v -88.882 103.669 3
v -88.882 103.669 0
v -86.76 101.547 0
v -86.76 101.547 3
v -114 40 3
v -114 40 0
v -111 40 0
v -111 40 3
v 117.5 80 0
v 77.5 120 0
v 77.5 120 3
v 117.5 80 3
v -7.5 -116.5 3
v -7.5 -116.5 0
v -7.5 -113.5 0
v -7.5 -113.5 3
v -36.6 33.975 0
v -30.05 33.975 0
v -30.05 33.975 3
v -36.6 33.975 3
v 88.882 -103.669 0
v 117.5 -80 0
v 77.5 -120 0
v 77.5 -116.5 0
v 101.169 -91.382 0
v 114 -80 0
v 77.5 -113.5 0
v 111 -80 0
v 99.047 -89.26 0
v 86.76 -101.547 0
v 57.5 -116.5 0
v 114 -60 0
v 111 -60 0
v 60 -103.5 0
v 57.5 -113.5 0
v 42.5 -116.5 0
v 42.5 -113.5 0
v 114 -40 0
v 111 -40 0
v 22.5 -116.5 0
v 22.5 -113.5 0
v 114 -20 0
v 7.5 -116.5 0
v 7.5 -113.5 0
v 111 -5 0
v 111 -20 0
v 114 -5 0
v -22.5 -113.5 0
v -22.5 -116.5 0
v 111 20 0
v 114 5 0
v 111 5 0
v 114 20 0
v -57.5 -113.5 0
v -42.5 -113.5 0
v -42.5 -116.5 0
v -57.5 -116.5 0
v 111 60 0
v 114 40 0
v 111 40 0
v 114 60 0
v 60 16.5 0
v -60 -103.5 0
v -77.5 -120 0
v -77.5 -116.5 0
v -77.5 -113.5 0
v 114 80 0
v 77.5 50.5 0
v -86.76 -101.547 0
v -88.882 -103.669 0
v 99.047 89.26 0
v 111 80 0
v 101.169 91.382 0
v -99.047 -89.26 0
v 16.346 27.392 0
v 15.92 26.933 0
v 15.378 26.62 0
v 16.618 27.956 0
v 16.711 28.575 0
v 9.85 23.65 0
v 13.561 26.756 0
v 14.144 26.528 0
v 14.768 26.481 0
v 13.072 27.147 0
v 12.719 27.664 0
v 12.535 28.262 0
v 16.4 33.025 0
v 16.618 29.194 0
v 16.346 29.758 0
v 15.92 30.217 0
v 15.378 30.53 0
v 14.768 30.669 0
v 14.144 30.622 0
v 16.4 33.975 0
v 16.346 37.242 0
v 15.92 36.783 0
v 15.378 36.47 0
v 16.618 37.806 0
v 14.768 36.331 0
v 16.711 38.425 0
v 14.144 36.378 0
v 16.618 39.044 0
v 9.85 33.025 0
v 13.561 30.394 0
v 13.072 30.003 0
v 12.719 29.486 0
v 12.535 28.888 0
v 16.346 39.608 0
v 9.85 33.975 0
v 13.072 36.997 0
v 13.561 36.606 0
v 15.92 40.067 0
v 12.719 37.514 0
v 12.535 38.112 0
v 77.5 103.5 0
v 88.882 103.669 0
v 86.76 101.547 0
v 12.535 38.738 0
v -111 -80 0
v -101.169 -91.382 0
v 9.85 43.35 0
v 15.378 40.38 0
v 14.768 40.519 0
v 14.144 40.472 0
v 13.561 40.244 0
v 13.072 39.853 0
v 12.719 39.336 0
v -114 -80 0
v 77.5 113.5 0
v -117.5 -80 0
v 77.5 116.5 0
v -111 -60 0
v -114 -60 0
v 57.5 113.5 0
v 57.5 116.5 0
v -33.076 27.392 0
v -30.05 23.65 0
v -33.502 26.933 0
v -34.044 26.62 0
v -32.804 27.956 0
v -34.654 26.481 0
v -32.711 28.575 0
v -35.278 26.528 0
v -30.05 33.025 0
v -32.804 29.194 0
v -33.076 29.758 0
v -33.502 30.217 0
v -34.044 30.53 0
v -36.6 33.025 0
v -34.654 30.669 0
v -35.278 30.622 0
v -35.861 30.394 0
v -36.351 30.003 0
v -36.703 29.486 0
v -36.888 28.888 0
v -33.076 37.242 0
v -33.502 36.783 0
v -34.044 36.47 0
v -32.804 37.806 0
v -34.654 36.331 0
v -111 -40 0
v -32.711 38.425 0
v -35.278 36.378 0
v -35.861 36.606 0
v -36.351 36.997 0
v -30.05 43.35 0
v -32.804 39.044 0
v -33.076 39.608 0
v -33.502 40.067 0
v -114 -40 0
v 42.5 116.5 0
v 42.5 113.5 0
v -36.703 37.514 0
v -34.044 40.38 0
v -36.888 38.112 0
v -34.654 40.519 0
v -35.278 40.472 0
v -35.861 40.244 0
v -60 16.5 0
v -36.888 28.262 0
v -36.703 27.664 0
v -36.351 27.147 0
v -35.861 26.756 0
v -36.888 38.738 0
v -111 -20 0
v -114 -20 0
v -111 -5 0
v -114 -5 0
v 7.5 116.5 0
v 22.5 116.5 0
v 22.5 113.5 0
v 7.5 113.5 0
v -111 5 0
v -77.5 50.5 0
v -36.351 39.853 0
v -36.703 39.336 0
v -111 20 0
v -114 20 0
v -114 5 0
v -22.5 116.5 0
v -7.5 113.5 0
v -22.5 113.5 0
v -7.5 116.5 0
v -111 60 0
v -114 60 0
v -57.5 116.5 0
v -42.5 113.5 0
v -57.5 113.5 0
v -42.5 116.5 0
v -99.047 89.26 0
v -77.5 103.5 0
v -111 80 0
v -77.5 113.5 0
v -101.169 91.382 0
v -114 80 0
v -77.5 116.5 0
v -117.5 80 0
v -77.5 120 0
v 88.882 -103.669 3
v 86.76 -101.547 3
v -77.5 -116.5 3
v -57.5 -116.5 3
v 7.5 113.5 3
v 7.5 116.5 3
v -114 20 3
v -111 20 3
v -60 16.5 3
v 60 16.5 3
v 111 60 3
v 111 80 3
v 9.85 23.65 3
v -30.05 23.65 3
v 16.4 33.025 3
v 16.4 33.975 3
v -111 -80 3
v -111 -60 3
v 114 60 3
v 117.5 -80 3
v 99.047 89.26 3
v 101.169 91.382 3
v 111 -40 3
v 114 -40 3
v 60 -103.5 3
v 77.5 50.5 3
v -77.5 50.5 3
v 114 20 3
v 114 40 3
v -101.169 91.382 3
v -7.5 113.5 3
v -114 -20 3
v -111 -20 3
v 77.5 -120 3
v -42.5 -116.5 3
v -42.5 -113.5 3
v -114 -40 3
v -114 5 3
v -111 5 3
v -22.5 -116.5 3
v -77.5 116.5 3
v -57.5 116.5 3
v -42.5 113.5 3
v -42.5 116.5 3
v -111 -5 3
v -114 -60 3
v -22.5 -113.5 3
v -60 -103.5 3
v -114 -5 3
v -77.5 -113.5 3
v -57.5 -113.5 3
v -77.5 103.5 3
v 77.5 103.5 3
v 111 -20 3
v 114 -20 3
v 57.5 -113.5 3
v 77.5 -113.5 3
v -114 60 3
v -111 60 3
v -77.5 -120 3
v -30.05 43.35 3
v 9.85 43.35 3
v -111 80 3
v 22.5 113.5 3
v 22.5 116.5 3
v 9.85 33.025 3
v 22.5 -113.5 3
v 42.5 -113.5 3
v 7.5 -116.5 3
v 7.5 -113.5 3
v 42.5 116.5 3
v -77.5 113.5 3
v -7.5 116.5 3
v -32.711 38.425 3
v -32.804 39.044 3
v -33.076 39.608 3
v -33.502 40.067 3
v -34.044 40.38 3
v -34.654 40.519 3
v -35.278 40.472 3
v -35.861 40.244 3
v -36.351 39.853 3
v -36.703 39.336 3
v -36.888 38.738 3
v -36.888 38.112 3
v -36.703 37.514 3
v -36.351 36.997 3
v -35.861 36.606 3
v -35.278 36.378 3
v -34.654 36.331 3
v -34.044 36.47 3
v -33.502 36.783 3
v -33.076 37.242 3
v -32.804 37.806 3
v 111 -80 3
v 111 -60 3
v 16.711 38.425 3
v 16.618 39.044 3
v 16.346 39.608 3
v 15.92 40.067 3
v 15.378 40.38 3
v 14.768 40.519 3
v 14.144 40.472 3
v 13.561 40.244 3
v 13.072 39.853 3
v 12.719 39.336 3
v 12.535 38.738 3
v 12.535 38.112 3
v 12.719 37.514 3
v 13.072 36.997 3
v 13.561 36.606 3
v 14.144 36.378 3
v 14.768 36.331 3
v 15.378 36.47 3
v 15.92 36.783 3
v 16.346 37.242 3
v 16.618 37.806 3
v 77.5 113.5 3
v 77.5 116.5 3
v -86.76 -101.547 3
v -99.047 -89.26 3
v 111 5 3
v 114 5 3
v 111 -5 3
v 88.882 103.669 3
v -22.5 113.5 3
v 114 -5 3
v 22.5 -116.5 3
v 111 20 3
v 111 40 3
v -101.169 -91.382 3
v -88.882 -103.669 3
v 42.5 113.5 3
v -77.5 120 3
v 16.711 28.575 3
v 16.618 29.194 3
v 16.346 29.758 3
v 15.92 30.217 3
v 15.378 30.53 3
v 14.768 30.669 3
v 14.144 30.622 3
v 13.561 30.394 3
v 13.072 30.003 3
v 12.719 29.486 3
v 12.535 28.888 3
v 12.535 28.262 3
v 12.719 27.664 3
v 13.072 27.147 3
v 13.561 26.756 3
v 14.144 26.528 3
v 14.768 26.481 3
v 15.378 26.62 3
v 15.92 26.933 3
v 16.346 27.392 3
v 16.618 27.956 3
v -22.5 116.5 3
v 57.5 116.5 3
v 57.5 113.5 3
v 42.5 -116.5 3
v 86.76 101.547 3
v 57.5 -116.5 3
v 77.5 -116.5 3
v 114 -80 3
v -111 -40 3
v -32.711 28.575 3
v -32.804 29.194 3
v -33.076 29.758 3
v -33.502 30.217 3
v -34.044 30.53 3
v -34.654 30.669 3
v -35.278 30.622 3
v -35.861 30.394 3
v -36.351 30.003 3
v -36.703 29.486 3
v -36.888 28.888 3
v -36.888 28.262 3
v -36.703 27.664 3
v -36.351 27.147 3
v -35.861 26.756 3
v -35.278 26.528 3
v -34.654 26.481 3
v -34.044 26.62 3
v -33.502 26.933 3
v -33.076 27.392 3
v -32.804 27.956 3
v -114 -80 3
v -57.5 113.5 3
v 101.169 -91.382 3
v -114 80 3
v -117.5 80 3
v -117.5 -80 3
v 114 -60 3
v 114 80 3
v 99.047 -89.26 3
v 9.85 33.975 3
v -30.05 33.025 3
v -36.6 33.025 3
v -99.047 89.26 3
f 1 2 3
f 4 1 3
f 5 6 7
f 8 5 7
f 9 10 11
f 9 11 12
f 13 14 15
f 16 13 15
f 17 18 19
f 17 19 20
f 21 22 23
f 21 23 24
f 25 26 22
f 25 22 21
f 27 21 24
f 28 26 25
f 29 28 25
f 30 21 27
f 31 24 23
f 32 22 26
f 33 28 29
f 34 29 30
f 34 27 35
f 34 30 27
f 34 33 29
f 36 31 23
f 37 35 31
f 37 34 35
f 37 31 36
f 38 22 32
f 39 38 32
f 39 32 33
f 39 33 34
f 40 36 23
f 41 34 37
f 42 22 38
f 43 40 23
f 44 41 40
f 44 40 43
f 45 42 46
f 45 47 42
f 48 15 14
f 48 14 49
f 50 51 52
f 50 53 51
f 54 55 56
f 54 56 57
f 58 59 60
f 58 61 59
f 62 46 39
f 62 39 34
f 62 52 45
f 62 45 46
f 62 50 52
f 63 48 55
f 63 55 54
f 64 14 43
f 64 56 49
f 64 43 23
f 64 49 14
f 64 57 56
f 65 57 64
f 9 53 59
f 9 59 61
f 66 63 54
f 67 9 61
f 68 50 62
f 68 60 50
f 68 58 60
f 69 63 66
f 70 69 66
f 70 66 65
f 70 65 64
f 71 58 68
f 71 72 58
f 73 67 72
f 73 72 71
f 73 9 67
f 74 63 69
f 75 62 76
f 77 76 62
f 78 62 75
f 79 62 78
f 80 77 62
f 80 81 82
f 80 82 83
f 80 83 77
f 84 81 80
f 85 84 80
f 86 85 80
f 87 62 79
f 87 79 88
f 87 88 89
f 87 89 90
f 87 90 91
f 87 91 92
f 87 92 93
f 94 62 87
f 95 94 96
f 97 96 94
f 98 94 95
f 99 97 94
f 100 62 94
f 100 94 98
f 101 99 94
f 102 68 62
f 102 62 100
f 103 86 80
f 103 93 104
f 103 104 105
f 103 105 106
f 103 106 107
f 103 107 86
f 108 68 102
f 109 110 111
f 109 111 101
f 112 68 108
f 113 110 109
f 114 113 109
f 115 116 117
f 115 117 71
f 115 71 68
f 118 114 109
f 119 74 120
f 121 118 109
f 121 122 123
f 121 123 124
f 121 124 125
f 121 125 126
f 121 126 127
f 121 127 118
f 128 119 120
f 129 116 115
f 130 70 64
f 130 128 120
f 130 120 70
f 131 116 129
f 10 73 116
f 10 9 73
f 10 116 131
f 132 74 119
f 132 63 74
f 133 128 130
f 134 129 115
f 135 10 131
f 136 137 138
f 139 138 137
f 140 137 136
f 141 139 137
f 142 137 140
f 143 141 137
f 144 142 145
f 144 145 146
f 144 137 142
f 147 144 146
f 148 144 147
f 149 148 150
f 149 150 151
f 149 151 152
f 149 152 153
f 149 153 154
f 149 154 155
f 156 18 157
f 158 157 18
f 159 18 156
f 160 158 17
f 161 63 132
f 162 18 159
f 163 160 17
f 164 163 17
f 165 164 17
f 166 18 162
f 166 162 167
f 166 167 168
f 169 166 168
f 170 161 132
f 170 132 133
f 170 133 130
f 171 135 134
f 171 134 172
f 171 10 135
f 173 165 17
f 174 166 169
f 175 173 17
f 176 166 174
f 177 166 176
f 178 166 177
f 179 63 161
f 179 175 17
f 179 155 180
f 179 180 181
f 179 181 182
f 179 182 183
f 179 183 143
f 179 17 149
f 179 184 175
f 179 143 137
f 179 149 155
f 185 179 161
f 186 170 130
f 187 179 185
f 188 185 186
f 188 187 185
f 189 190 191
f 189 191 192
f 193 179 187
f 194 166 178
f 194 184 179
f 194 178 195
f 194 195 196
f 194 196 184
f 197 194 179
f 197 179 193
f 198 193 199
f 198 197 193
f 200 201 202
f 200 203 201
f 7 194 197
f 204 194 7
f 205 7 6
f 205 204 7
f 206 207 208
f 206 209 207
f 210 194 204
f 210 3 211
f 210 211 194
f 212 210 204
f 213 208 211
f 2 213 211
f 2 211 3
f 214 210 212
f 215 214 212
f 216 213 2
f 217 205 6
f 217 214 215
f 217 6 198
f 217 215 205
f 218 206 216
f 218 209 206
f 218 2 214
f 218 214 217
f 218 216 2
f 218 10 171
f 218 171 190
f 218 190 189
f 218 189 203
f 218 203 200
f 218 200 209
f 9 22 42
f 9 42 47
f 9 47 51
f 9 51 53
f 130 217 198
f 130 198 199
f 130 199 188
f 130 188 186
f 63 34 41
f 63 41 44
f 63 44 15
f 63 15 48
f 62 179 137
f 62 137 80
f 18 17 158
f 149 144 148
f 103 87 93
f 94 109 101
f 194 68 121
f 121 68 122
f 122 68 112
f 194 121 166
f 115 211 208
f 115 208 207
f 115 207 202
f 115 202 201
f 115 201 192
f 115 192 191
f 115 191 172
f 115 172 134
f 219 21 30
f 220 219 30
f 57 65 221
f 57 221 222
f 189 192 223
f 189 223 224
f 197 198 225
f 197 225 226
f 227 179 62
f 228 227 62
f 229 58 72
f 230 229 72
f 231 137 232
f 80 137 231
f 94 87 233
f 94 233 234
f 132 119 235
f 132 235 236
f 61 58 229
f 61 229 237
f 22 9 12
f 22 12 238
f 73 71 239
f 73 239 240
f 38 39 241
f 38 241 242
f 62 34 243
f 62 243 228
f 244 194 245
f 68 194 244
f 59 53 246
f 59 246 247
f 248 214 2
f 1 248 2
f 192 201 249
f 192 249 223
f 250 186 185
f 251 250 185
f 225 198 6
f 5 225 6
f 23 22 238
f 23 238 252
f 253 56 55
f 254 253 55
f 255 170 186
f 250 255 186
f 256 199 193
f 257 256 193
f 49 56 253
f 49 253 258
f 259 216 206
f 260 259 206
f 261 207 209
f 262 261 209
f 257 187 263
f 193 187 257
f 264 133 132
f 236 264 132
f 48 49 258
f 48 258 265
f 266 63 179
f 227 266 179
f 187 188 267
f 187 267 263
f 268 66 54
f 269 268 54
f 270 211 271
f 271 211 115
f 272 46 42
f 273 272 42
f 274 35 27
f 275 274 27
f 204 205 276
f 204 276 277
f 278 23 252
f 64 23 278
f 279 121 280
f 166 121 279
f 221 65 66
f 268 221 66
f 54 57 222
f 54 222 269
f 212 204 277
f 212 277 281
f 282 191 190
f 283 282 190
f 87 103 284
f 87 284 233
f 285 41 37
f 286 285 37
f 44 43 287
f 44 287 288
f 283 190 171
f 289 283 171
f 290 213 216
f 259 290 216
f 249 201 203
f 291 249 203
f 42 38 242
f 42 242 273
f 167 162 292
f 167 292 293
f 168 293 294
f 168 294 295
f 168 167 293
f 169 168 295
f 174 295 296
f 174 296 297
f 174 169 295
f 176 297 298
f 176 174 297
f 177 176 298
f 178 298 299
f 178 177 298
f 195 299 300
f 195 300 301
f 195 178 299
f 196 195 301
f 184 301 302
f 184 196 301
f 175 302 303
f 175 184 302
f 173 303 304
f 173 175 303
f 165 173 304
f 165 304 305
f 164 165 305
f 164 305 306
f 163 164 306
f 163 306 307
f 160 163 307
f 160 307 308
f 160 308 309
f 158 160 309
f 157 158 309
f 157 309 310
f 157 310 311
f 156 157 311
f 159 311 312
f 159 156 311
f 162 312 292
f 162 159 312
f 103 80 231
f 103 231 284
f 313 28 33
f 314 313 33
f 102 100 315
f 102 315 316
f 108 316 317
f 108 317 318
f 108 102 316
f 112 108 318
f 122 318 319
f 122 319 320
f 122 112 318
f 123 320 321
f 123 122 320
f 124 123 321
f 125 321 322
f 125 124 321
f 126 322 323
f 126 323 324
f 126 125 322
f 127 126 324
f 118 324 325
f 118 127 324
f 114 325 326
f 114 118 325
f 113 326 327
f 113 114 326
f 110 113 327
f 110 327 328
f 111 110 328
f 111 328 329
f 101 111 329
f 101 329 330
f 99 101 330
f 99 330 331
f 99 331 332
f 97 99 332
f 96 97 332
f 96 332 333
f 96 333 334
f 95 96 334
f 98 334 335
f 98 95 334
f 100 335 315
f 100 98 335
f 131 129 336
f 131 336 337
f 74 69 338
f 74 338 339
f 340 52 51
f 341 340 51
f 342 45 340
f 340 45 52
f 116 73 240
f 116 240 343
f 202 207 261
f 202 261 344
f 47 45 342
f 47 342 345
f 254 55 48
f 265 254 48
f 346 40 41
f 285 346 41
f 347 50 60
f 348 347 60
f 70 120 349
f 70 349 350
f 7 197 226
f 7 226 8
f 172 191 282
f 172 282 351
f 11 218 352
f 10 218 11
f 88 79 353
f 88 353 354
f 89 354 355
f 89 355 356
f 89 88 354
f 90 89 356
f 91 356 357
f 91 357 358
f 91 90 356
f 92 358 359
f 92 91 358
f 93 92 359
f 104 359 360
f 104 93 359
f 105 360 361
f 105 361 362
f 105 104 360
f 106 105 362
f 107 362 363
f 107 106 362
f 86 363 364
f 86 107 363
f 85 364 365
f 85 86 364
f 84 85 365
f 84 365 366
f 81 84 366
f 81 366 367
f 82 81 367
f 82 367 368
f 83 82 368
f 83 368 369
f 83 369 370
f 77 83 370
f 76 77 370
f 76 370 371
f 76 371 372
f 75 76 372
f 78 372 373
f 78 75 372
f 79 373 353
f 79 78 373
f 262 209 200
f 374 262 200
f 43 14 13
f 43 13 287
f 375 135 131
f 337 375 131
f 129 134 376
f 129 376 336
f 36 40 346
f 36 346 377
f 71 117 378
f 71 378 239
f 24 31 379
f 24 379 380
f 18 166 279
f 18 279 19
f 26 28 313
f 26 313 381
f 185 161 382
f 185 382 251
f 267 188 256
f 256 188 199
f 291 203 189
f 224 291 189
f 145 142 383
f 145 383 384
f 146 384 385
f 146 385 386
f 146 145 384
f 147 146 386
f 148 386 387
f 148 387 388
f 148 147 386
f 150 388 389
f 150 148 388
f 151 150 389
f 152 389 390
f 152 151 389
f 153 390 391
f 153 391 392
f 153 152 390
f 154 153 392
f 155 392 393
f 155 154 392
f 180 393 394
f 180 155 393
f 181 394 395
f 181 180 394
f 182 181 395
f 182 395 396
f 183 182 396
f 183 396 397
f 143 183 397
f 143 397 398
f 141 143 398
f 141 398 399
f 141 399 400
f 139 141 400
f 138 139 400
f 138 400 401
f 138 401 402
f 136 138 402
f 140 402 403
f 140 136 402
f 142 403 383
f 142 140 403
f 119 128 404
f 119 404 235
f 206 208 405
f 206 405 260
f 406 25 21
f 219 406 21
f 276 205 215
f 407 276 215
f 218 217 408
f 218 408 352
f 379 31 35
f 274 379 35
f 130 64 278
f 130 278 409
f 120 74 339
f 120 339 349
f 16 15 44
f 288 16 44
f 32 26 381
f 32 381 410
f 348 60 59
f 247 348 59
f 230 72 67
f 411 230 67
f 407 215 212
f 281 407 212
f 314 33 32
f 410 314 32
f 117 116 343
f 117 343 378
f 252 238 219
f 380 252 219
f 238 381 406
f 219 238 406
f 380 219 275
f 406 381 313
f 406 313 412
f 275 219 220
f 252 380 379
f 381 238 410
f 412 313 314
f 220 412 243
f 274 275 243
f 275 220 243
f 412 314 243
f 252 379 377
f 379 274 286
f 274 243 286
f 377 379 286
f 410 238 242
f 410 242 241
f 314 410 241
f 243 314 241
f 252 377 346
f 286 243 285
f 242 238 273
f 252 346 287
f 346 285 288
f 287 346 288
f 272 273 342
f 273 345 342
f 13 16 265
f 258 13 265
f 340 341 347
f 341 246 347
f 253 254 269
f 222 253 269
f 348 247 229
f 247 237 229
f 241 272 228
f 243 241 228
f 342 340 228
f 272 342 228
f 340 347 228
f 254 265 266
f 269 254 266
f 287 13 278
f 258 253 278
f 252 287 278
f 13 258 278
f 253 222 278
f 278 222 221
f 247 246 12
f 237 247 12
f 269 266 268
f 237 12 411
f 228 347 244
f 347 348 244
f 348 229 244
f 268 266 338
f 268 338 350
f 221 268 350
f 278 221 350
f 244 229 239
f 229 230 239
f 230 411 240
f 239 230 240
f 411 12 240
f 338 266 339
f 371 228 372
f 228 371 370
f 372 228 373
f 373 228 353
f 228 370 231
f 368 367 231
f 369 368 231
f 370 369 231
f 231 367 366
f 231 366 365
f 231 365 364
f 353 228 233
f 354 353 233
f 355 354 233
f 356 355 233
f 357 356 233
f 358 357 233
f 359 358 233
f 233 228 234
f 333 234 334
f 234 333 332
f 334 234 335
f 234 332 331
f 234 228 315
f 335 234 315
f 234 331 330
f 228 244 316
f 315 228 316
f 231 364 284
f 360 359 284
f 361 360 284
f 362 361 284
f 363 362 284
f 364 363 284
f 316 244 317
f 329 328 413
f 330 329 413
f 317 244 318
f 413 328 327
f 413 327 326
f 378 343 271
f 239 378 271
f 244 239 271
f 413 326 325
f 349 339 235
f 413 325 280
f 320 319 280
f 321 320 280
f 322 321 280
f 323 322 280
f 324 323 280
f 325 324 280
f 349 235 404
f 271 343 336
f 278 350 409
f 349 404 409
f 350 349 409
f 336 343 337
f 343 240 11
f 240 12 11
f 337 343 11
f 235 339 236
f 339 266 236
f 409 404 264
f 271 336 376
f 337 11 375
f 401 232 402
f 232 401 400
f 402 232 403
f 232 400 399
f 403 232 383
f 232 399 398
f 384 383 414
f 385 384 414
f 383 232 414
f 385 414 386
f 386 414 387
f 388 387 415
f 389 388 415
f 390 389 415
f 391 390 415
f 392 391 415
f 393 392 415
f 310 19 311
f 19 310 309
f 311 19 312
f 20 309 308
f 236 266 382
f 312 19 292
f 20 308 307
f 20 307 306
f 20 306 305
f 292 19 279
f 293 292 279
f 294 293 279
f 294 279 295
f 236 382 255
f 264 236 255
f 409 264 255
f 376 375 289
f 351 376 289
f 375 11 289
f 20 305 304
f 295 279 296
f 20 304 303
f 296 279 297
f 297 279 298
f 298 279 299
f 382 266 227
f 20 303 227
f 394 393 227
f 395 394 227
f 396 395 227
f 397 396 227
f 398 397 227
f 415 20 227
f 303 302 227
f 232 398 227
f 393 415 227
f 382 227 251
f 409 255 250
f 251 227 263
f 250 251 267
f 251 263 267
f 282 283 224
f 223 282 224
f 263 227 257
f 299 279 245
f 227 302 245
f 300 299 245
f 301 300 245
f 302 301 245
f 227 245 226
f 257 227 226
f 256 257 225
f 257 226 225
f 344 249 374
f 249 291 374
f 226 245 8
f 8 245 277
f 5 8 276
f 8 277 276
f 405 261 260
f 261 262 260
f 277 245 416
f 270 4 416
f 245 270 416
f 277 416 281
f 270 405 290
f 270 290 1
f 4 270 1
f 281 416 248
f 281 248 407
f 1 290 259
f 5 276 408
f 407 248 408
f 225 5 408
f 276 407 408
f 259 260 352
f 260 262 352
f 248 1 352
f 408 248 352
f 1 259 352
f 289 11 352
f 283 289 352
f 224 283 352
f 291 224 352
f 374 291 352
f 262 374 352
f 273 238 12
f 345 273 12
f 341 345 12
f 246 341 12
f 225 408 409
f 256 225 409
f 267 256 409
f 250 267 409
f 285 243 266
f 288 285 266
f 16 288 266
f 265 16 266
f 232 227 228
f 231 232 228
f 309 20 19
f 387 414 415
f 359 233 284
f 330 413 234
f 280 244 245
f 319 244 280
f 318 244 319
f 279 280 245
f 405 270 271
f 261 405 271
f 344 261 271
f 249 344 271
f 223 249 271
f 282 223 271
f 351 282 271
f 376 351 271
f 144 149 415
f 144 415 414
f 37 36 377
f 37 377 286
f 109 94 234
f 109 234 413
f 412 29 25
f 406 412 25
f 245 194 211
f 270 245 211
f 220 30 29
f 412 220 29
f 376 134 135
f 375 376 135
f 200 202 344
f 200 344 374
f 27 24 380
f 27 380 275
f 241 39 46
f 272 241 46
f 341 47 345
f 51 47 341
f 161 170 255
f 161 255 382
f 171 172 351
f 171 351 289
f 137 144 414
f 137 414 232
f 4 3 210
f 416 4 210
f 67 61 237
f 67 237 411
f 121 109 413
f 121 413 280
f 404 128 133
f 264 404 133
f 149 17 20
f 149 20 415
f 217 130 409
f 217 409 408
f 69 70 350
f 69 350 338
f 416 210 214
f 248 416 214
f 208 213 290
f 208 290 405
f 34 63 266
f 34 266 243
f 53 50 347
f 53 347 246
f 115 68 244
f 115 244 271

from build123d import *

# Parameters (mm, degrees)
SKICA2_R                = 2.1
SKICA2_W                = 3
SKICA2_H                = 20
SKICA2_H_2              = 10
SKICA2_W_2              = 20
SKICA2_H_3              = 3
SKICA2_W_3              = 15
SKICA2_W_4              = 155
SKICA2_H_4              = 53
SKICA2_W_5              = 120
SKICA2_H_5              = 120
P_IDAT_VYSUNUT_M1_DEPTH = 3


with BuildPart() as part:
    # Skica2 → Přidat vysunutím1 (new body)
    with BuildSketch(Plane.XY):
        Polygon((-117.5, 80), (-77.5, 120), (77.5, 120), (117.5, 80), (117.5, -80), (77.5, -120), (-77.5, -120), (-117.5, -80), align=None)
        with Locations((14.611145618, 38.425)):
            Circle(SKICA2_R, mode=Mode.SUBTRACT)
        with Locations((14.611145618, 28.575)):
            Circle(SKICA2_R, mode=Mode.SUBTRACT)
        with Locations((-34.811145618, 28.575)):
            Circle(SKICA2_R, mode=Mode.SUBTRACT)
        with Locations((-34.811145618, 38.425)):
            Circle(SKICA2_R, mode=Mode.SUBTRACT)
        with Locations((-112.5, 70)):
            Rectangle(SKICA2_W, SKICA2_H, mode=Mode.SUBTRACT)
        with Locations((-112.5, 30)):
            Rectangle(SKICA2_W, SKICA2_H, mode=Mode.SUBTRACT)
        with Locations((-112.5, 0)):
            Rectangle(SKICA2_W, SKICA2_H_2, mode=Mode.SUBTRACT)
        with Locations((-112.5, -30)):
            Rectangle(SKICA2_W, SKICA2_H, mode=Mode.SUBTRACT)
        with Locations((-112.5, -70)):
            Rectangle(SKICA2_W, SKICA2_H, mode=Mode.SUBTRACT)
        with Locations((112.5, -70)):
            Rectangle(SKICA2_W, SKICA2_H, mode=Mode.SUBTRACT)
        with Locations((112.5, -30)):
            Rectangle(SKICA2_W, SKICA2_H, mode=Mode.SUBTRACT)
        with Locations((112.5, 0)):
            Rectangle(SKICA2_W, SKICA2_H_2, mode=Mode.SUBTRACT)
        with Locations((112.5, 30)):
            Rectangle(SKICA2_W, SKICA2_H, mode=Mode.SUBTRACT)
        with Locations((112.5, 70)):
            Rectangle(SKICA2_W, SKICA2_H, mode=Mode.SUBTRACT)
        with Locations((-67.5, 115)):
            Rectangle(SKICA2_W_2, SKICA2_H_3, mode=Mode.SUBTRACT)
        with Locations((-32.5, 115)):
            Rectangle(SKICA2_W_2, SKICA2_H_3, mode=Mode.SUBTRACT)
        with Locations((0, 115)):
            Rectangle(SKICA2_W_3, SKICA2_H_3, mode=Mode.SUBTRACT)
        with Locations((32.5, 115)):
            Rectangle(SKICA2_W_2, SKICA2_H_3, mode=Mode.SUBTRACT)
        with Locations((67.5, 115)):
            Rectangle(SKICA2_W_2, SKICA2_H_3, mode=Mode.SUBTRACT)
        with Locations((67.5, -115)):
            Rectangle(SKICA2_W_2, SKICA2_H_3, mode=Mode.SUBTRACT)
        with Locations((32.5, -115)):
            Rectangle(SKICA2_W_2, SKICA2_H_3, mode=Mode.SUBTRACT)
        with Locations((0, -115)):
            Rectangle(SKICA2_W_3, SKICA2_H_3, mode=Mode.SUBTRACT)
        with Locations((-32.5, -115)):
            Rectangle(SKICA2_W_2, SKICA2_H_3, mode=Mode.SUBTRACT)
        with Locations((-67.5, -115)):
            Rectangle(SKICA2_W_2, SKICA2_H_3, mode=Mode.SUBTRACT)
        Polygon((101.168524548, -91.381727984), (88.881727984, -103.668524548), (86.76040764, -101.547204204), (99.047204204, -89.26040764), align=None, mode=Mode.SUBTRACT)
        Polygon((-86.76040764, -101.547204204), (-99.047204204, -89.26040764), (-101.168524548, -91.381727984), (-88.881727984, -103.668524548), align=None, mode=Mode.SUBTRACT)
        Polygon((86.76040764, 101.547204204), (99.047204204, 89.26040764), (101.168524548, 91.381727984), (88.881727984, 103.668524548), align=None, mode=Mode.SUBTRACT)
        Polygon((-88.881727984, 103.668524548), (-86.76040764, 101.547204204), (-99.047204204, 89.26040764), (-101.168524548, 91.381727984), align=None, mode=Mode.SUBTRACT)
        with Locations((0, 77)):
            Rectangle(SKICA2_W_4, SKICA2_H_4, mode=Mode.SUBTRACT)
        with Locations((0, -43.5)):
            Rectangle(SKICA2_W_5, SKICA2_H_5, mode=Mode.SUBTRACT)
        Polygon((-30.05, 43.35), (-30.05, 33.975), (-36.6, 33.975), (-36.6, 33.025), (-30.05, 33.025), (-30.05, 23.65), (9.85, 23.65), (9.85, 33.025), (16.4, 33.025), (16.4, 33.975), (9.85, 33.975), (9.85, 43.35), align=None, mode=Mode.SUBTRACT)
    extrude(amount=P_IDAT_VYSUNUT_M1_DEPTH)


solid = part.part
